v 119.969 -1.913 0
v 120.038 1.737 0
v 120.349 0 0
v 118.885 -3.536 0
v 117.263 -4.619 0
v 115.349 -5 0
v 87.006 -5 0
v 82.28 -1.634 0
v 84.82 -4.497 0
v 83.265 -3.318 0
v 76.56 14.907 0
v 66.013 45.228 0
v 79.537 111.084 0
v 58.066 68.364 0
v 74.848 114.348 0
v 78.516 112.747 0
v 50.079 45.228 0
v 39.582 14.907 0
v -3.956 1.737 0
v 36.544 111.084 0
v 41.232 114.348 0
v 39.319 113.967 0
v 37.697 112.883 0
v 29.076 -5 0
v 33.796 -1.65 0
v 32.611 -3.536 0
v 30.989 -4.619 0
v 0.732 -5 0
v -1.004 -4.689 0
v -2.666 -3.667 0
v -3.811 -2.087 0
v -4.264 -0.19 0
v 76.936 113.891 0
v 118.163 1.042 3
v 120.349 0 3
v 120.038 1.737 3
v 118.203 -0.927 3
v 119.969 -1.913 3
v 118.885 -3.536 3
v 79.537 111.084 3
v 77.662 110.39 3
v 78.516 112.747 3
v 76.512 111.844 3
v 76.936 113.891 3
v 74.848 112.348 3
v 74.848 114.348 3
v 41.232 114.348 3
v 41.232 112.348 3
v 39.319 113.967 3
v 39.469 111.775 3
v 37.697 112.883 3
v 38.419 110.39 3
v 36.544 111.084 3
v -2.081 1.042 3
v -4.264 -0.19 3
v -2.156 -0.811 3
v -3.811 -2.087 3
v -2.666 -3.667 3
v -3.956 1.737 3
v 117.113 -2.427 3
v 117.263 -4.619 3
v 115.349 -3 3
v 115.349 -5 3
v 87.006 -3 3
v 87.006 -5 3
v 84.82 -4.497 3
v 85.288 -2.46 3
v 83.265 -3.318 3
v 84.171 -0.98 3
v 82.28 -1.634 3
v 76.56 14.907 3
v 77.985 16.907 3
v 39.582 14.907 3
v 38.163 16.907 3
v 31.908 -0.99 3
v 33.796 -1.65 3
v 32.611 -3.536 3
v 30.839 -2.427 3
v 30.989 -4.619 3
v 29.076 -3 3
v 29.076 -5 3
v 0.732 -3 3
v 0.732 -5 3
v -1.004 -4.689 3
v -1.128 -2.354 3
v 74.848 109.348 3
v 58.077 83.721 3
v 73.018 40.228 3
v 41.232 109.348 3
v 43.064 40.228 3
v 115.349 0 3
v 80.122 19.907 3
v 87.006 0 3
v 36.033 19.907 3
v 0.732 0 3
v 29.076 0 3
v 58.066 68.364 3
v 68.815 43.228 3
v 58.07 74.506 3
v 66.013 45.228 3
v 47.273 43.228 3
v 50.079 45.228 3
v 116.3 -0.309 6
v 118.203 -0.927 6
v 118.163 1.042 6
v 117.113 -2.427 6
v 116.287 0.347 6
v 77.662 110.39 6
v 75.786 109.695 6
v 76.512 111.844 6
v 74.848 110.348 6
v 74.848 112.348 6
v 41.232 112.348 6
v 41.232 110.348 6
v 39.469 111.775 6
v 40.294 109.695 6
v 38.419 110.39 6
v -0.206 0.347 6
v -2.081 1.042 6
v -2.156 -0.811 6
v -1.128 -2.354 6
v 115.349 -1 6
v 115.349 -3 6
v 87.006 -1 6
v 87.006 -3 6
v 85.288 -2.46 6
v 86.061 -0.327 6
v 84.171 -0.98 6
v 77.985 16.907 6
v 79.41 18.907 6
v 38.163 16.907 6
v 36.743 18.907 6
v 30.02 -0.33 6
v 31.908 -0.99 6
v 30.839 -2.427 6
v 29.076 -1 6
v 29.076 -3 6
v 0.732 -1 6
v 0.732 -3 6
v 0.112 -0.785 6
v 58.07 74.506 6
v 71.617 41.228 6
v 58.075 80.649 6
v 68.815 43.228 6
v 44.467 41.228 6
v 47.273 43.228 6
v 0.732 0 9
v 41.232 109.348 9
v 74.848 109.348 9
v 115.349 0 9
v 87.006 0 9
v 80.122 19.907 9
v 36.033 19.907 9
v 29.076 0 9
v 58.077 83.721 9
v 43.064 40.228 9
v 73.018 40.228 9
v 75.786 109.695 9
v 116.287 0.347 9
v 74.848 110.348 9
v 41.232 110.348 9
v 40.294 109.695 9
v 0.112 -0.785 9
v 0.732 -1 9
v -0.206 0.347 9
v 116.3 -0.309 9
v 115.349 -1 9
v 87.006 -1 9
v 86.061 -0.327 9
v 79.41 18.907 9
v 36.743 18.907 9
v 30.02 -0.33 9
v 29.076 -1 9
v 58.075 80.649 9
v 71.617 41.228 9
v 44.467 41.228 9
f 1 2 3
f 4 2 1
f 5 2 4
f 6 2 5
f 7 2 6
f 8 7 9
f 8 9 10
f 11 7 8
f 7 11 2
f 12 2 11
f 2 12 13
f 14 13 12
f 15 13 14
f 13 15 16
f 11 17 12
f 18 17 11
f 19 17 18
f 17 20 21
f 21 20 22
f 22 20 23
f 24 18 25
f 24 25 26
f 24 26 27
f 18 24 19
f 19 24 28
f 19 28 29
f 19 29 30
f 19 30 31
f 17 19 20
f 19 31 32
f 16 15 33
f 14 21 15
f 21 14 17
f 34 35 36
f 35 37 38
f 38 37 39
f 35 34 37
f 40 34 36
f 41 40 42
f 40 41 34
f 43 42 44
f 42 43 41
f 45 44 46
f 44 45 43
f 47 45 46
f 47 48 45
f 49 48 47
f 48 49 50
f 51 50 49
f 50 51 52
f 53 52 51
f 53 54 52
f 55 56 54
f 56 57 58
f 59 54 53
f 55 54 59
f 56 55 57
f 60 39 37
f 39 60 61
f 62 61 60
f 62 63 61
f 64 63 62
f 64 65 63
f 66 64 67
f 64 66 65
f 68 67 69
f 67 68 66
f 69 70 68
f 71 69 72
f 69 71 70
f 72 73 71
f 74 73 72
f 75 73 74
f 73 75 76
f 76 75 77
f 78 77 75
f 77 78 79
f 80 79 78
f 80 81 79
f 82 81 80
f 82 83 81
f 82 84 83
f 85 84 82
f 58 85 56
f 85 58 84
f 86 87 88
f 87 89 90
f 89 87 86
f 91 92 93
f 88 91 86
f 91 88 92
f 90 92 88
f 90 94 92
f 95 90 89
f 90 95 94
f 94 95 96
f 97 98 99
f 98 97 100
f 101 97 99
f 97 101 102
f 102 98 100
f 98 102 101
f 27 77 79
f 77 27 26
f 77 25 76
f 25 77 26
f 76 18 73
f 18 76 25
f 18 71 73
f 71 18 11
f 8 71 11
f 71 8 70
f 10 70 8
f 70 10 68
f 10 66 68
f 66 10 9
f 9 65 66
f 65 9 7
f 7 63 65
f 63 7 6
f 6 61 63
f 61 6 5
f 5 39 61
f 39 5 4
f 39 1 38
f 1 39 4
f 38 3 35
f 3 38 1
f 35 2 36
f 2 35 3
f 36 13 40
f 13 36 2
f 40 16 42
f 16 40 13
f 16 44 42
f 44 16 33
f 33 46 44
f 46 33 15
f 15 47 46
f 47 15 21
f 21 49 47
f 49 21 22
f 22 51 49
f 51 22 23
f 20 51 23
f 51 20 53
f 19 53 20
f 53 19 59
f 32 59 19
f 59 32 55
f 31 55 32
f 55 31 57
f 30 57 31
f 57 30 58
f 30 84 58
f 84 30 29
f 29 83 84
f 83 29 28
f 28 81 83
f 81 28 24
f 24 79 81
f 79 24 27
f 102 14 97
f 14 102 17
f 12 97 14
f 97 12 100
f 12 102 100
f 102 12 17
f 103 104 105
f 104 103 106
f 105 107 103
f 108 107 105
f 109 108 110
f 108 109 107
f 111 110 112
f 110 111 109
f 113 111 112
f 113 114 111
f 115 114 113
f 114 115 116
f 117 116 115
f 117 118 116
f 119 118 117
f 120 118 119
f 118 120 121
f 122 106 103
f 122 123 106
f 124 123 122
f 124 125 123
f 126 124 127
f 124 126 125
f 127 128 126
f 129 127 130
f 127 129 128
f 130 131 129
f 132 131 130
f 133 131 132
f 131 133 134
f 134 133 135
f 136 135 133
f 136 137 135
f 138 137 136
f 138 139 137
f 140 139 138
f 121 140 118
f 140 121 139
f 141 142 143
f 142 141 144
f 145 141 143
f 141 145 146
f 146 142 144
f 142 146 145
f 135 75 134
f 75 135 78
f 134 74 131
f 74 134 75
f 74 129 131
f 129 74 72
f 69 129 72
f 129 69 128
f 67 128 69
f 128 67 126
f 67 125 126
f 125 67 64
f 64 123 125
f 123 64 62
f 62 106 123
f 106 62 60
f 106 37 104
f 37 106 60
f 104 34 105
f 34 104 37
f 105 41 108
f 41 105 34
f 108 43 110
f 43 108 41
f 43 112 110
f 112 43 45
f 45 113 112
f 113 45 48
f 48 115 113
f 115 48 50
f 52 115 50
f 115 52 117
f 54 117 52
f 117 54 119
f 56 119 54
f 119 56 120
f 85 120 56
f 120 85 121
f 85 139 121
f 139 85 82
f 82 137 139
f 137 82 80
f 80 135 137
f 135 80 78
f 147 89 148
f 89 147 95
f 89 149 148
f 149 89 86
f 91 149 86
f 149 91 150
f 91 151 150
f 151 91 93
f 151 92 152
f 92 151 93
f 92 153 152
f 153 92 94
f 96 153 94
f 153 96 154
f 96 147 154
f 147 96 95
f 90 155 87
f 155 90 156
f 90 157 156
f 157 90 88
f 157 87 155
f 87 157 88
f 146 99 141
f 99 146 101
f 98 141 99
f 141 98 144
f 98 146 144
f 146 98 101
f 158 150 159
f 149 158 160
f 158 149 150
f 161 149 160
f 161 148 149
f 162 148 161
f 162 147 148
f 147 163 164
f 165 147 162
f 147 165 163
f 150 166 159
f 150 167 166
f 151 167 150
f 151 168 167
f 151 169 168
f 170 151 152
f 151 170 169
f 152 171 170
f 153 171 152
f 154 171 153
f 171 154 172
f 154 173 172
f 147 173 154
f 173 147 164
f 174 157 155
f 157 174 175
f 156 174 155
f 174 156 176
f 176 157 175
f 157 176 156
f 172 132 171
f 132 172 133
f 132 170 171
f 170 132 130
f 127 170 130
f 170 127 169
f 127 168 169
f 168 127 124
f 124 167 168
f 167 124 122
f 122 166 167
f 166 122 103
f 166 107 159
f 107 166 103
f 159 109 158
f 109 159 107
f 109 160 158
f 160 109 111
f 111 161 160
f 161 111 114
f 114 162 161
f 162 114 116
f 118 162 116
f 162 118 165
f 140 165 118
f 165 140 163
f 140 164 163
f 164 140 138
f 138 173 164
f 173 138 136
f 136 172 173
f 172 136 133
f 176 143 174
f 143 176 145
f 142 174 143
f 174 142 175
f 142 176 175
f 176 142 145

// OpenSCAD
//use <C:\Users\terry\Downloads\Product Sans Regular.ttf>
//text = "Gogle";
letter = "A";
module print(letter) { text(letter, 72*1.5, "Product Sans:style=Bold"); }
//text(text, 24, "Product Sans:style=Regular");
//for(i = [0:len(text)]) {
    //let(letter=text[i])
    //translate([i*200, 0, 0]) union() {
        linear_extrude(3)
            offset(5) print(letter);
        linear_extrude(6)
            difference() {
                offset(3) print(letter);
                print(letter);
            };
        linear_extrude(9)
            difference() {
                offset(1) print(letter);
                print(letter);
            };
    //}
//}
